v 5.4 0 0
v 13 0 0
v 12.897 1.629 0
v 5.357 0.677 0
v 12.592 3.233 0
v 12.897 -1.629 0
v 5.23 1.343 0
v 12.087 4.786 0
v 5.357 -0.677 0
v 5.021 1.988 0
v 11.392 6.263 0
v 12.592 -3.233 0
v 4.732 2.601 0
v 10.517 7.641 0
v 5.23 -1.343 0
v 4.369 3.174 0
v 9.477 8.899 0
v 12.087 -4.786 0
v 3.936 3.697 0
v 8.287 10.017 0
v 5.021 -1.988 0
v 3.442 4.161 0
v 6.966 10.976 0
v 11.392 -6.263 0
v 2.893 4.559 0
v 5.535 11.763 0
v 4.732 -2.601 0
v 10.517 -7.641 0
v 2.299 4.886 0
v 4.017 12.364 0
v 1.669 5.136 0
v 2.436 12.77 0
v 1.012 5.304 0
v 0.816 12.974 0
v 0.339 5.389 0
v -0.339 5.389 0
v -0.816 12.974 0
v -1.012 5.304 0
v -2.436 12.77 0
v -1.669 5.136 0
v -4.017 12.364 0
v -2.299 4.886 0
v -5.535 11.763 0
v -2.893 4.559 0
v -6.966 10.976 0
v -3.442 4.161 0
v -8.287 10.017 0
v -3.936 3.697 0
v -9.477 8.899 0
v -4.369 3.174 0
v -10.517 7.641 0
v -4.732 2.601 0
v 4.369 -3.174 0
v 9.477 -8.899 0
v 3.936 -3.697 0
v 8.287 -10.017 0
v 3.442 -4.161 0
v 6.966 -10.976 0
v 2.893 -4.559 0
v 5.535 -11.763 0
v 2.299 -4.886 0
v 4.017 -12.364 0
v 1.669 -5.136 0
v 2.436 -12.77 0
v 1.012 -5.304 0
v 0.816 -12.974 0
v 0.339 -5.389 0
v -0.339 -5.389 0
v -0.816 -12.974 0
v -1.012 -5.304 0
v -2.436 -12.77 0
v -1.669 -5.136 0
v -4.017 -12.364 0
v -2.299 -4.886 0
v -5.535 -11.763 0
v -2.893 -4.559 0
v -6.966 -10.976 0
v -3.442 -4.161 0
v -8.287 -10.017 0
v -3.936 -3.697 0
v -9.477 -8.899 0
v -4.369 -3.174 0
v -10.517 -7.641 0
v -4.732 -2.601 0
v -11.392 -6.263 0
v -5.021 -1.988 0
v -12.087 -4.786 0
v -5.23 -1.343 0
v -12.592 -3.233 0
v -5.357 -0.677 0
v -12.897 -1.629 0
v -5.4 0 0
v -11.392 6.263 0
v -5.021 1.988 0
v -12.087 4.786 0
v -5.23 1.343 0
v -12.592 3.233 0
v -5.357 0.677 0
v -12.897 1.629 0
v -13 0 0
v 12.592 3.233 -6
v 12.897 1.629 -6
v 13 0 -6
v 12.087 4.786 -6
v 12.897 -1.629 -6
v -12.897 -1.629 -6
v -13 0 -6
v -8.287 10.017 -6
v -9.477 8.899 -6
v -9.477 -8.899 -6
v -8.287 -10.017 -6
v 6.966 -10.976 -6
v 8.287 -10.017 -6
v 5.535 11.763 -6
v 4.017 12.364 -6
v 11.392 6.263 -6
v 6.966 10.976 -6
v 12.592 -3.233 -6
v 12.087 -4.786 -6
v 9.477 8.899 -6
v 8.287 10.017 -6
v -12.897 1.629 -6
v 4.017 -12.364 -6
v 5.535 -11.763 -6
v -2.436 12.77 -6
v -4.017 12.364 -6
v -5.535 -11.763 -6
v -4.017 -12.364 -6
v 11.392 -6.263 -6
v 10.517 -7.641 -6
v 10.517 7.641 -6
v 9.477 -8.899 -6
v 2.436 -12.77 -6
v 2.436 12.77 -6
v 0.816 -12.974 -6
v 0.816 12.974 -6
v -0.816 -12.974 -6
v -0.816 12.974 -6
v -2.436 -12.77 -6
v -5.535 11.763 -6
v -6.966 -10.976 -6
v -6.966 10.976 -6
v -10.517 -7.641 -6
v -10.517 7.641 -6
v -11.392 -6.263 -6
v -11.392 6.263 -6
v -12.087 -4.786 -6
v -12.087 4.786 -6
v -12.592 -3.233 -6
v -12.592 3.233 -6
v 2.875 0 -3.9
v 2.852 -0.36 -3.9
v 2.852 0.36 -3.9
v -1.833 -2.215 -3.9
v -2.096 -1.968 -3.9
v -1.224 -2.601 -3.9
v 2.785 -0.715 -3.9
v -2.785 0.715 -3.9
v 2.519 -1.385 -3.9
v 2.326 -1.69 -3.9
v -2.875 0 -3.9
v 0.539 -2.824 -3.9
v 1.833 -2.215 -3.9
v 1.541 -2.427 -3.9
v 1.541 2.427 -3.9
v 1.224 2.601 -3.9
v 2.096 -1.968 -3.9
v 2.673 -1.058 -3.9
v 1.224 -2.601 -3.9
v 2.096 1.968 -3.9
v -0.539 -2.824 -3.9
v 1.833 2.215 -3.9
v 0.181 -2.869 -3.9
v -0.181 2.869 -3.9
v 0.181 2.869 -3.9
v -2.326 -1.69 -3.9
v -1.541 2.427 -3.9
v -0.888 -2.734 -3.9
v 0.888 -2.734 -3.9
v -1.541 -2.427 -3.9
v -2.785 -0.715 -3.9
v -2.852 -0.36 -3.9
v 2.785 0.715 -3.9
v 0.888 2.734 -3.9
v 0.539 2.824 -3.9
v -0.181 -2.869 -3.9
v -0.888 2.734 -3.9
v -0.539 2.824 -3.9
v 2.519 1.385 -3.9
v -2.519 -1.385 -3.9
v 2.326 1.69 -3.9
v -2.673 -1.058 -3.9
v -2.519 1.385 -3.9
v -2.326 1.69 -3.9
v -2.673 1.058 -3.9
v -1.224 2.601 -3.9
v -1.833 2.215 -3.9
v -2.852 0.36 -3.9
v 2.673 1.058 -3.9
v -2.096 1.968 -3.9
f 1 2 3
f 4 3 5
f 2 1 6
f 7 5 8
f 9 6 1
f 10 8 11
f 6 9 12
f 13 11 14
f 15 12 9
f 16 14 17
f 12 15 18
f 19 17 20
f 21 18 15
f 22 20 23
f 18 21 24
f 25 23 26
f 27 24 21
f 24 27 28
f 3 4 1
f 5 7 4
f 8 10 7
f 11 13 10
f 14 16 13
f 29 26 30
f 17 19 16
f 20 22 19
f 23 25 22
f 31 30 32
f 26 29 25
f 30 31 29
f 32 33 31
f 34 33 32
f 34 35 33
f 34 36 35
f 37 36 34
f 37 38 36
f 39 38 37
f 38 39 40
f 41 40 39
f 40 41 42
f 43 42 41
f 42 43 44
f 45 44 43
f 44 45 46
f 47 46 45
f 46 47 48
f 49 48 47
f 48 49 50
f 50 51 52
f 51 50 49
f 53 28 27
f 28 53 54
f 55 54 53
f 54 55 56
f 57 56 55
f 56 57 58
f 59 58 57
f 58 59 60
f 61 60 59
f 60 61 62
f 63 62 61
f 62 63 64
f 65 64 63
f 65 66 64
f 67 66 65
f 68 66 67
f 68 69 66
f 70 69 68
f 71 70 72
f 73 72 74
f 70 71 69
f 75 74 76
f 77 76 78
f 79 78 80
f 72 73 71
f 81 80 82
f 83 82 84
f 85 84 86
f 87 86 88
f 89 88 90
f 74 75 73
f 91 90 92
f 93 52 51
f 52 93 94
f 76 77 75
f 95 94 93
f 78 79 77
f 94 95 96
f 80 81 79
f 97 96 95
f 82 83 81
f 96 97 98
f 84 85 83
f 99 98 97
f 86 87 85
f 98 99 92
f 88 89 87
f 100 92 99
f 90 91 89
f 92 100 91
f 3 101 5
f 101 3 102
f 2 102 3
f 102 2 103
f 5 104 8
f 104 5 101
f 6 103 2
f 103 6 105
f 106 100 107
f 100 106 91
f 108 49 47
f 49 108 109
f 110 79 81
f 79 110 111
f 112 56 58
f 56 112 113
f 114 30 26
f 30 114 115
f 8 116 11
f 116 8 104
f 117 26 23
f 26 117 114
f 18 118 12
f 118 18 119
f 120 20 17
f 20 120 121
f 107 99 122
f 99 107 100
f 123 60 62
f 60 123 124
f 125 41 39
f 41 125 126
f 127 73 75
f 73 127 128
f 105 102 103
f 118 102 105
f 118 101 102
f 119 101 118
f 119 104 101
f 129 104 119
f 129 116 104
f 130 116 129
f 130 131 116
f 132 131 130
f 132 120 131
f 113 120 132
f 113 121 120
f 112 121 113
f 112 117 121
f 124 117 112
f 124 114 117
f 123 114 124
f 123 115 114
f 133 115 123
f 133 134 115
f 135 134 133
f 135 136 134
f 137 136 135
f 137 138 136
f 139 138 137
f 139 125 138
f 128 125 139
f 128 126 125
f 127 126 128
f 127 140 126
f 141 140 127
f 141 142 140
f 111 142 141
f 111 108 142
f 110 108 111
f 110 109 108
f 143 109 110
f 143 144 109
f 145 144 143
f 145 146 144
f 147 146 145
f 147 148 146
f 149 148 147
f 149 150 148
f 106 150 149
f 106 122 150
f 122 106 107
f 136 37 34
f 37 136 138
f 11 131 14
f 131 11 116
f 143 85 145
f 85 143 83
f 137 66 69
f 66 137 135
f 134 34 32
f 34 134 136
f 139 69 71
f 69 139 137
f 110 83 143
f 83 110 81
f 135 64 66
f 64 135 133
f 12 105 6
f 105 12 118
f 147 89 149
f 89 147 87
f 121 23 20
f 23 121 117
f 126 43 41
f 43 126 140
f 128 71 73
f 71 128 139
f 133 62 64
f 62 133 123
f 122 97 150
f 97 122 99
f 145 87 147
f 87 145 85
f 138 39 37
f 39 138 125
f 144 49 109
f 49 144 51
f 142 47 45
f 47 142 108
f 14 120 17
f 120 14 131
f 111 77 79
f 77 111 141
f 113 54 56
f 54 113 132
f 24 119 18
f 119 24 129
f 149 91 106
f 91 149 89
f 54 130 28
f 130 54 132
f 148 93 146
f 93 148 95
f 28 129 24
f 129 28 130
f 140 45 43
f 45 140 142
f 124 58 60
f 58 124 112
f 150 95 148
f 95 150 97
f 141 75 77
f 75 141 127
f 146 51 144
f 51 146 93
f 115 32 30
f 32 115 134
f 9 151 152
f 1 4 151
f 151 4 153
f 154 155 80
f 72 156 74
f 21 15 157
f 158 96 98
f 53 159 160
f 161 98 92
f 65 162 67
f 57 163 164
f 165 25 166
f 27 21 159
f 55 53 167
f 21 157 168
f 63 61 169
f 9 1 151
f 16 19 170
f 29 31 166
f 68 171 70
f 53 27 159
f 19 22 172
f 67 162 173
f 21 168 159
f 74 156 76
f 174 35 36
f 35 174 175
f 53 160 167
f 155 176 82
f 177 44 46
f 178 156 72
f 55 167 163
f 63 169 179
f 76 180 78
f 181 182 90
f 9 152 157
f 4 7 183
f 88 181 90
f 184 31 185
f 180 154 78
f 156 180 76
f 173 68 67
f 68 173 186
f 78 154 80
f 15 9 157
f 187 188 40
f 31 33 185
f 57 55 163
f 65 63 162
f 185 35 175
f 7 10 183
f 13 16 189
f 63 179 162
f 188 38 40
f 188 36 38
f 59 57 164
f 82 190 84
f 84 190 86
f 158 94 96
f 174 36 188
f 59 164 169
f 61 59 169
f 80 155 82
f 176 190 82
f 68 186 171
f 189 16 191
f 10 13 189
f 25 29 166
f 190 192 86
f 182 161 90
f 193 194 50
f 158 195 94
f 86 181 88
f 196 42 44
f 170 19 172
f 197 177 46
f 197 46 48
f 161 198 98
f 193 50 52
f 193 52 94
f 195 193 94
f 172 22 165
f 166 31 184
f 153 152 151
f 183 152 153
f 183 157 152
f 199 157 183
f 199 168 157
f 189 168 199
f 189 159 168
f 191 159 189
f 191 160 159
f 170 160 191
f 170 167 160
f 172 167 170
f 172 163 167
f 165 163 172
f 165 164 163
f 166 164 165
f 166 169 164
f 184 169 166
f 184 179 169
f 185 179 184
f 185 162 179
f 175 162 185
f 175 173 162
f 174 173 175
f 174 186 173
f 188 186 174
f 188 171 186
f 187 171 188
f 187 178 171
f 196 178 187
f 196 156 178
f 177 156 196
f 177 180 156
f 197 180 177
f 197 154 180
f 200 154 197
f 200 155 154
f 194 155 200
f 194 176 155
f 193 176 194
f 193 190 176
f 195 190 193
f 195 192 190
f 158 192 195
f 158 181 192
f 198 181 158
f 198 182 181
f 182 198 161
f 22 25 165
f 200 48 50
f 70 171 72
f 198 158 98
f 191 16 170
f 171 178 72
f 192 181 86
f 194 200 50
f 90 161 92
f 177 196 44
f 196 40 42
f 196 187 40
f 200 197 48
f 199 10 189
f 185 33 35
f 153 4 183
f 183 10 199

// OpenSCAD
$fn = 50;


difference() {
	union() {
		translate(v = [0, 0, -3.0000000000]) {
			cylinder(h = 3, r = 10.0000000000);
		}
		translate(v = [0, 0, -6.0000000000]) {
			cylinder(h = 6, r = 13.0000000000);
		}
	}
	union() {
		translate(v = [0, 0, 0]) {
			rotate(a = [0, 0, 0]) {
				difference() {
					union() {
						#translate(v = [0, 0, -3.0000000000]) {
							cylinder(h = 3, r = 2.6000000000);
						}
						#translate(v = [0, 0, -3.9000000000]) {
							cylinder(h = 3.9000000000, r = 10.0000000000, r1 = 2.8750000000, r2 = 5.4000000000);
						}
						#translate(v = [0, 0, -3.0000000000]) {
							cylinder(h = 3, r = 2.8750000000);
						}
						#translate(v = [0, 0, -3.0000000000]) {
							cylinder(h = 3, r = 2.6000000000);
						}
					}
					union();
				}
			}
		}
	}
}
